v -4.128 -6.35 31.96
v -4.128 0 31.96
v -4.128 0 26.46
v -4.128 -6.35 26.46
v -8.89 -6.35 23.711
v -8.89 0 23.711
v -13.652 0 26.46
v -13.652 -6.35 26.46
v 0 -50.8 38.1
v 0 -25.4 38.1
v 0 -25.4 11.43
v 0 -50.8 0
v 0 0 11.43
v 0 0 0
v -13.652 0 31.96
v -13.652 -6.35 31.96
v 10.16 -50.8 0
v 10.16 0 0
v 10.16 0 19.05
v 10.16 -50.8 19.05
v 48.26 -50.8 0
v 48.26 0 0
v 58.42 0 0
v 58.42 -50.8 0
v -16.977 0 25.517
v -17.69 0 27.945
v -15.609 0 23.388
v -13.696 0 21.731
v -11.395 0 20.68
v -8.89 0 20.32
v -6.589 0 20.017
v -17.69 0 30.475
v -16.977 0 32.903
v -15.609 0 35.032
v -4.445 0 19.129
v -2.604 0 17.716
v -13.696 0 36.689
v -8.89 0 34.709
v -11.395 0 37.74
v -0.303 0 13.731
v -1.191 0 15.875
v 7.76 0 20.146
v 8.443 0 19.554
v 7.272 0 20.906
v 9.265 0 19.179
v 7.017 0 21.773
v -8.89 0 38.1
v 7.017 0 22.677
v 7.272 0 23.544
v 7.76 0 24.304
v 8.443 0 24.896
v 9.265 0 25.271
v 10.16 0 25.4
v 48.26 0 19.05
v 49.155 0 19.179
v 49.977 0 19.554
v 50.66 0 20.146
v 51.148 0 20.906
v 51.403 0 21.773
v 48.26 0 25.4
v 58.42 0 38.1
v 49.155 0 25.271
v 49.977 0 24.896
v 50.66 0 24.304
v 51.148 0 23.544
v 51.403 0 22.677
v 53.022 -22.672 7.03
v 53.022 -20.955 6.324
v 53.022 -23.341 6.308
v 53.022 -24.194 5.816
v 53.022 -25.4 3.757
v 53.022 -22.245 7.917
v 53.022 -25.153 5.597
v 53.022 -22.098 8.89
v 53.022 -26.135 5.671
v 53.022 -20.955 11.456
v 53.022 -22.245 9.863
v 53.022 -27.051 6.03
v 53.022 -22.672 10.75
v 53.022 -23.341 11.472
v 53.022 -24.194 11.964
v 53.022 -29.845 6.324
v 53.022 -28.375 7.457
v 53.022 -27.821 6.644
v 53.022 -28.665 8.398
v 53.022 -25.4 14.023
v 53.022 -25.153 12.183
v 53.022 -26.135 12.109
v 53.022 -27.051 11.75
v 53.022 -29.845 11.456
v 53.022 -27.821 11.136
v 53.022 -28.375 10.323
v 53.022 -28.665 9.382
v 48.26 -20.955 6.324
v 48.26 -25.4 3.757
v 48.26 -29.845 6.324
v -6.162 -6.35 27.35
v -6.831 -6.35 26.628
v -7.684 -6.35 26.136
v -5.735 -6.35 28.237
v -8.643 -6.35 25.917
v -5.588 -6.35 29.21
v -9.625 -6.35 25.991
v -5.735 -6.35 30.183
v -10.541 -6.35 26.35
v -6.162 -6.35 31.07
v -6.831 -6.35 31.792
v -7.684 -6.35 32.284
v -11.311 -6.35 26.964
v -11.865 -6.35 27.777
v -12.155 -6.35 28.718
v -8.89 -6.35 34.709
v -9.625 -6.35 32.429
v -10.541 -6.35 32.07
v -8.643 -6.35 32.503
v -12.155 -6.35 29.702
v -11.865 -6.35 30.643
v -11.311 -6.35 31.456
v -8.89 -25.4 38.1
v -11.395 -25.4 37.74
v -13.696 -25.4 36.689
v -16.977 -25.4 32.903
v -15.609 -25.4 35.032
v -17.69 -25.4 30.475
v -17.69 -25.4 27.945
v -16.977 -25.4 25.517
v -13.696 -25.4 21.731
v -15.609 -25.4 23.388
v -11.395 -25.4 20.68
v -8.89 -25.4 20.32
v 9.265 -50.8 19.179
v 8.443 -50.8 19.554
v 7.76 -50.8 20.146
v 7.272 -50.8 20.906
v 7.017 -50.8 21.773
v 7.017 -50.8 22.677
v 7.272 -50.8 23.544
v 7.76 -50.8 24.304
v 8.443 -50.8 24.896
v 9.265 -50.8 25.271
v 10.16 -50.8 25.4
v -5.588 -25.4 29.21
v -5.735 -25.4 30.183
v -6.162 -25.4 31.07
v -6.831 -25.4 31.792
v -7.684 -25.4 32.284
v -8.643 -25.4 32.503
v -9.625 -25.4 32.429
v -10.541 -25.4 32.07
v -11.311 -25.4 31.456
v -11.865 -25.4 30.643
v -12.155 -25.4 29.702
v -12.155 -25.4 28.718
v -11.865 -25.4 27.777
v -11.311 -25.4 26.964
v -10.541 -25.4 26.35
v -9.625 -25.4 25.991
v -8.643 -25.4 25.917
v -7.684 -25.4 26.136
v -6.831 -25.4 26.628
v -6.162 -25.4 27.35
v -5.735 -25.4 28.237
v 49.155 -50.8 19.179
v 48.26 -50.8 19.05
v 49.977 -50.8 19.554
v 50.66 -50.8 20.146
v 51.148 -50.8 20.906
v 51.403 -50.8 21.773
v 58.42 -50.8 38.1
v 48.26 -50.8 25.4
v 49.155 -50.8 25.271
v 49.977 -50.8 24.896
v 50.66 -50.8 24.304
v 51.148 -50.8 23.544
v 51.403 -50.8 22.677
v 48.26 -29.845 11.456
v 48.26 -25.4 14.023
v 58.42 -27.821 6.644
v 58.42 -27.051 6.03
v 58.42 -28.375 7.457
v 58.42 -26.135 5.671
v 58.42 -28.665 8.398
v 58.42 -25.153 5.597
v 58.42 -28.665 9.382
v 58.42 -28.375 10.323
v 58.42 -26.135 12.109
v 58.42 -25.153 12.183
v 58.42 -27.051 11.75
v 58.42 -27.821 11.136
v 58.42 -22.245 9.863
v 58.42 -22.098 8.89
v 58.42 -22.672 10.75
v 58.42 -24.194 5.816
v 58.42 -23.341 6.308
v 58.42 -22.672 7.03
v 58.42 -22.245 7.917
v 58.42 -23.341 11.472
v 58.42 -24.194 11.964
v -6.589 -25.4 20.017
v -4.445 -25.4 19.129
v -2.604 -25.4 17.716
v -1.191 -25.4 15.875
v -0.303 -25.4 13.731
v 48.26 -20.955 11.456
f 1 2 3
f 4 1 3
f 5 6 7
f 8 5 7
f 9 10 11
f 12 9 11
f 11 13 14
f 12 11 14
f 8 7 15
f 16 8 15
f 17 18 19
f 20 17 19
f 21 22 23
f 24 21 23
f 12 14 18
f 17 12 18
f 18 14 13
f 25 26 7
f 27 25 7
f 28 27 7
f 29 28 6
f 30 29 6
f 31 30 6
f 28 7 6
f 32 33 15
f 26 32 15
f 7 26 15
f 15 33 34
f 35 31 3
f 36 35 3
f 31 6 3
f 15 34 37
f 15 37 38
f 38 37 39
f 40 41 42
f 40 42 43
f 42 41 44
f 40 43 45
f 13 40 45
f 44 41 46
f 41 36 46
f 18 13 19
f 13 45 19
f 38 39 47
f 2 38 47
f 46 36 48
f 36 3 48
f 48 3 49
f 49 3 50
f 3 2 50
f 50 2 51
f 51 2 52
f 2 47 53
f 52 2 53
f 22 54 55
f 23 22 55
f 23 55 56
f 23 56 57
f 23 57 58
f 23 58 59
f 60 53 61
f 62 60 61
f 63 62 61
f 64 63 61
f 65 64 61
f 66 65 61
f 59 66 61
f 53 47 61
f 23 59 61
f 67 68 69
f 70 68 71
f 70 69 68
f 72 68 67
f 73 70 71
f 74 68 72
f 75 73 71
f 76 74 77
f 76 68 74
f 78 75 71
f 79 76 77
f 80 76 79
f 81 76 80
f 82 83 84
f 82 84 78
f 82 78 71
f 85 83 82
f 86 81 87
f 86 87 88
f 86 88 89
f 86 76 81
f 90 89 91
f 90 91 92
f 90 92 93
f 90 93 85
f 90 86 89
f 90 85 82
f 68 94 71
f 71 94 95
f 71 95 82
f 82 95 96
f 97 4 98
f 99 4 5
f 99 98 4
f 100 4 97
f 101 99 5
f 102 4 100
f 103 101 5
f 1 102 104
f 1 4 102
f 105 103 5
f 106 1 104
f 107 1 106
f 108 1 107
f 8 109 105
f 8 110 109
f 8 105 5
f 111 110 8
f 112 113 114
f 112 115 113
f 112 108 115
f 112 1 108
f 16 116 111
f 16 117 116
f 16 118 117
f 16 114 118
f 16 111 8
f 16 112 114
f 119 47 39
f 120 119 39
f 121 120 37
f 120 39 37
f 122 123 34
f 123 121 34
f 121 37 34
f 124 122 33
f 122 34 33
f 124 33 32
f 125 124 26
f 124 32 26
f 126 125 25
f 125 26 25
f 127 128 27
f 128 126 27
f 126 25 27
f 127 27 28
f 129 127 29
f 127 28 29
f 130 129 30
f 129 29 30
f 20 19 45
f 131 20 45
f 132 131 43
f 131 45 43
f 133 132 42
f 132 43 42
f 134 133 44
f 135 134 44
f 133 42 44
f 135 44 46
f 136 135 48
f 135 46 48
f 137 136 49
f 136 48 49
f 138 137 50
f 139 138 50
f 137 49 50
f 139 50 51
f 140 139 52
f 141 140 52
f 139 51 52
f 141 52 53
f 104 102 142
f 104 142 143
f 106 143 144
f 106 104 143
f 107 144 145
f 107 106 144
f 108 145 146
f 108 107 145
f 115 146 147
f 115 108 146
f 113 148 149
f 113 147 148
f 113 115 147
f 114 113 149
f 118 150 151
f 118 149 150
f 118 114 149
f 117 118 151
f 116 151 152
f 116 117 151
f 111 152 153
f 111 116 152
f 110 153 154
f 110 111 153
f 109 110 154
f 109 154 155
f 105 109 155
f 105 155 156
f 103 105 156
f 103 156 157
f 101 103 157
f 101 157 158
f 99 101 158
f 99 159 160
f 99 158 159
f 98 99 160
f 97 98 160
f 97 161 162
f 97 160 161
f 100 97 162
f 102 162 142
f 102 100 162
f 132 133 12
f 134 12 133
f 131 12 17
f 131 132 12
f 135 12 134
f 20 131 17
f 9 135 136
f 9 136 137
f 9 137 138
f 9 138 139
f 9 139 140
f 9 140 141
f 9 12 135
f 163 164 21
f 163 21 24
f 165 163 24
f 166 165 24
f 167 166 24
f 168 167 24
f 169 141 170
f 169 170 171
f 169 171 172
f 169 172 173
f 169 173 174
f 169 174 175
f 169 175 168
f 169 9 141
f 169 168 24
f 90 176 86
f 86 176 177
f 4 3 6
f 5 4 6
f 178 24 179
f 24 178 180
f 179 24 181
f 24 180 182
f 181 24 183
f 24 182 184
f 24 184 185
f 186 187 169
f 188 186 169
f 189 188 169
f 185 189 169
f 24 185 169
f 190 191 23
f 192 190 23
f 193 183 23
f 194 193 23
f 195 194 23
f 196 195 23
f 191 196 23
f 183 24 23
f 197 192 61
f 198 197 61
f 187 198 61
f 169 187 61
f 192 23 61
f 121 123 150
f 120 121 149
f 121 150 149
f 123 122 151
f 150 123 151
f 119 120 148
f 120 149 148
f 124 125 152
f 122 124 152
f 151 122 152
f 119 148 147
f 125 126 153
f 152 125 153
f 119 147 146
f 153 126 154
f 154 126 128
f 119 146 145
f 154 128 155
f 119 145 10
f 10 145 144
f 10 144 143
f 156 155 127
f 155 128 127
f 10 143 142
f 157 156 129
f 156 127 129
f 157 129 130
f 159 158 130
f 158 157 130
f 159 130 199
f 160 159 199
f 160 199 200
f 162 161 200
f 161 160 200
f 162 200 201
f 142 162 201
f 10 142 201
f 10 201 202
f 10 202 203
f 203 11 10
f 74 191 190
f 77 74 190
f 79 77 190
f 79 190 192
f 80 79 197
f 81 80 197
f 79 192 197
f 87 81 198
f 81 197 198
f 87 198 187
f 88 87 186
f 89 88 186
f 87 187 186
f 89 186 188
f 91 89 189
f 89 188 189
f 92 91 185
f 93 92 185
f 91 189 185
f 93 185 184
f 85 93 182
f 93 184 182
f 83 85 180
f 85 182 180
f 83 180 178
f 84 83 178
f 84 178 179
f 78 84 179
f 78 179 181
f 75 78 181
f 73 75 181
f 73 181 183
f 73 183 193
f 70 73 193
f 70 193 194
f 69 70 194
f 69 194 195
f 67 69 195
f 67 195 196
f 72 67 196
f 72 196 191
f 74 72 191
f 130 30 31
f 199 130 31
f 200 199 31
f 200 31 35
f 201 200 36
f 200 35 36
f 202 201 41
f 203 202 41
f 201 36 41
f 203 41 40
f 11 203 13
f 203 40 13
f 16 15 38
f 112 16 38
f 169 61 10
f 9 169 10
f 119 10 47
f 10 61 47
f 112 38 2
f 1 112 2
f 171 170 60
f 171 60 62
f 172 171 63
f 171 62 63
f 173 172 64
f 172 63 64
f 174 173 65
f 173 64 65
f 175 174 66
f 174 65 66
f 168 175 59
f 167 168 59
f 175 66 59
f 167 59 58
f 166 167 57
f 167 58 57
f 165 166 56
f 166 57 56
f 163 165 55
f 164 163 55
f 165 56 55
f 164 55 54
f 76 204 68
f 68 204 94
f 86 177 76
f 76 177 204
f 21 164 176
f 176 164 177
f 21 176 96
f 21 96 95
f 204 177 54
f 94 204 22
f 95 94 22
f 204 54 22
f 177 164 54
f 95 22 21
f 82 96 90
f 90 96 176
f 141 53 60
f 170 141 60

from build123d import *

# Parameters (mm, degrees)
F0_R     = 3.302
F1_DEPTH = 50.8
F3_DEPTH = 38.101
F4_R     = 3.302
F5_DEPTH = 6.35
F6_R     = 3.302
F7_DEPTH = 10.16
F9_DEPTH = 4.7625


with BuildPart() as f1:
    # F0 (on Front) → F1 (new body)
    with BuildSketch(Plane.XZ):
        with BuildLine():
            Line((0, 11.43), (0, 0))
            Line((0, 0), (10.16, 0))
            Line((10.16, 0), (10.16, 19.05))
            ThreePointArc((10.16, 19.05), (6.985, 22.225), (10.16, 25.4))
            Line((10.16, 25.4), (48.26, 25.4))
            ThreePointArc((48.26, 25.4), (51.435, 22.225), (48.26, 19.05))
            Line((48.26, 19.05), (48.26, 0))
            Line((48.26, 0), (58.42, 0))
            Line((58.42, 0), (58.42, 38.1))
            Line((58.42, 38.1), (-8.89, 38.1))
            ThreePointArc((-8.89, 38.1), (-17.78, 29.21), (-8.89, 20.32))
            ThreePointArc((-8.89, 20.32), (-2.603821, 17.716179), (0, 11.43))
        make_face()
        with Locations((-8.89, 29.21)):
            Circle(F0_R, mode=Mode.SUBTRACT)
    extrude(amount=F1_DEPTH)

    # F2 (on face) → F3 (cut, through all)
    with BuildSketch(Plane(origin=(0, 0, 0), x_dir=(1, 0, 0), z_dir=(0, 0, -1))):
        Polygon((0, 50.8), (-8.89, 50.8), (-17.78, 50.8), (-17.78, 25.4), (0, 25.4), align=None)
    extrude(amount=-F3_DEPTH, mode=Mode.SUBTRACT)

    # F4 (on face) → F5 (cut)
    with BuildSketch(Plane(origin=(0, 0, 0), x_dir=(-1, 0, 0), z_dir=(0, 1, 0))):
        Polygon((13.6525, 26.460369), (13.6525, 31.959631), (8.89, 34.709261), (4.1275, 31.959631), (4.1275, 26.460369), (8.89, 23.710739), align=None)
        with Locations((8.89, 29.21)):
            Circle(F4_R, mode=Mode.SUBTRACT)
    extrude(amount=-F5_DEPTH, mode=Mode.SUBTRACT)

    # F6 (on face) → F7 (cut, through all)
    with BuildSketch(Plane.YZ.offset(58.42)):
        with Locations((-25.4, 8.89)):
            Circle(F6_R)
    extrude(amount=-F7_DEPTH, mode=Mode.SUBTRACT)

    # F8 (on face) → F9 (cut)
    with BuildSketch(Plane(origin=(48.26, 0, 0), x_dir=(0, -1, 0), z_dir=(-1, 0, 0))):
        Polygon((29.845, 11.456322), (25.4, 14.022644), (20.955, 11.456322), (20.955, 6.323678), (25.4, 3.757356), (29.845, 6.323678), align=None)
    extrude(amount=-F9_DEPTH, mode=Mode.SUBTRACT)


solid = f1.part
